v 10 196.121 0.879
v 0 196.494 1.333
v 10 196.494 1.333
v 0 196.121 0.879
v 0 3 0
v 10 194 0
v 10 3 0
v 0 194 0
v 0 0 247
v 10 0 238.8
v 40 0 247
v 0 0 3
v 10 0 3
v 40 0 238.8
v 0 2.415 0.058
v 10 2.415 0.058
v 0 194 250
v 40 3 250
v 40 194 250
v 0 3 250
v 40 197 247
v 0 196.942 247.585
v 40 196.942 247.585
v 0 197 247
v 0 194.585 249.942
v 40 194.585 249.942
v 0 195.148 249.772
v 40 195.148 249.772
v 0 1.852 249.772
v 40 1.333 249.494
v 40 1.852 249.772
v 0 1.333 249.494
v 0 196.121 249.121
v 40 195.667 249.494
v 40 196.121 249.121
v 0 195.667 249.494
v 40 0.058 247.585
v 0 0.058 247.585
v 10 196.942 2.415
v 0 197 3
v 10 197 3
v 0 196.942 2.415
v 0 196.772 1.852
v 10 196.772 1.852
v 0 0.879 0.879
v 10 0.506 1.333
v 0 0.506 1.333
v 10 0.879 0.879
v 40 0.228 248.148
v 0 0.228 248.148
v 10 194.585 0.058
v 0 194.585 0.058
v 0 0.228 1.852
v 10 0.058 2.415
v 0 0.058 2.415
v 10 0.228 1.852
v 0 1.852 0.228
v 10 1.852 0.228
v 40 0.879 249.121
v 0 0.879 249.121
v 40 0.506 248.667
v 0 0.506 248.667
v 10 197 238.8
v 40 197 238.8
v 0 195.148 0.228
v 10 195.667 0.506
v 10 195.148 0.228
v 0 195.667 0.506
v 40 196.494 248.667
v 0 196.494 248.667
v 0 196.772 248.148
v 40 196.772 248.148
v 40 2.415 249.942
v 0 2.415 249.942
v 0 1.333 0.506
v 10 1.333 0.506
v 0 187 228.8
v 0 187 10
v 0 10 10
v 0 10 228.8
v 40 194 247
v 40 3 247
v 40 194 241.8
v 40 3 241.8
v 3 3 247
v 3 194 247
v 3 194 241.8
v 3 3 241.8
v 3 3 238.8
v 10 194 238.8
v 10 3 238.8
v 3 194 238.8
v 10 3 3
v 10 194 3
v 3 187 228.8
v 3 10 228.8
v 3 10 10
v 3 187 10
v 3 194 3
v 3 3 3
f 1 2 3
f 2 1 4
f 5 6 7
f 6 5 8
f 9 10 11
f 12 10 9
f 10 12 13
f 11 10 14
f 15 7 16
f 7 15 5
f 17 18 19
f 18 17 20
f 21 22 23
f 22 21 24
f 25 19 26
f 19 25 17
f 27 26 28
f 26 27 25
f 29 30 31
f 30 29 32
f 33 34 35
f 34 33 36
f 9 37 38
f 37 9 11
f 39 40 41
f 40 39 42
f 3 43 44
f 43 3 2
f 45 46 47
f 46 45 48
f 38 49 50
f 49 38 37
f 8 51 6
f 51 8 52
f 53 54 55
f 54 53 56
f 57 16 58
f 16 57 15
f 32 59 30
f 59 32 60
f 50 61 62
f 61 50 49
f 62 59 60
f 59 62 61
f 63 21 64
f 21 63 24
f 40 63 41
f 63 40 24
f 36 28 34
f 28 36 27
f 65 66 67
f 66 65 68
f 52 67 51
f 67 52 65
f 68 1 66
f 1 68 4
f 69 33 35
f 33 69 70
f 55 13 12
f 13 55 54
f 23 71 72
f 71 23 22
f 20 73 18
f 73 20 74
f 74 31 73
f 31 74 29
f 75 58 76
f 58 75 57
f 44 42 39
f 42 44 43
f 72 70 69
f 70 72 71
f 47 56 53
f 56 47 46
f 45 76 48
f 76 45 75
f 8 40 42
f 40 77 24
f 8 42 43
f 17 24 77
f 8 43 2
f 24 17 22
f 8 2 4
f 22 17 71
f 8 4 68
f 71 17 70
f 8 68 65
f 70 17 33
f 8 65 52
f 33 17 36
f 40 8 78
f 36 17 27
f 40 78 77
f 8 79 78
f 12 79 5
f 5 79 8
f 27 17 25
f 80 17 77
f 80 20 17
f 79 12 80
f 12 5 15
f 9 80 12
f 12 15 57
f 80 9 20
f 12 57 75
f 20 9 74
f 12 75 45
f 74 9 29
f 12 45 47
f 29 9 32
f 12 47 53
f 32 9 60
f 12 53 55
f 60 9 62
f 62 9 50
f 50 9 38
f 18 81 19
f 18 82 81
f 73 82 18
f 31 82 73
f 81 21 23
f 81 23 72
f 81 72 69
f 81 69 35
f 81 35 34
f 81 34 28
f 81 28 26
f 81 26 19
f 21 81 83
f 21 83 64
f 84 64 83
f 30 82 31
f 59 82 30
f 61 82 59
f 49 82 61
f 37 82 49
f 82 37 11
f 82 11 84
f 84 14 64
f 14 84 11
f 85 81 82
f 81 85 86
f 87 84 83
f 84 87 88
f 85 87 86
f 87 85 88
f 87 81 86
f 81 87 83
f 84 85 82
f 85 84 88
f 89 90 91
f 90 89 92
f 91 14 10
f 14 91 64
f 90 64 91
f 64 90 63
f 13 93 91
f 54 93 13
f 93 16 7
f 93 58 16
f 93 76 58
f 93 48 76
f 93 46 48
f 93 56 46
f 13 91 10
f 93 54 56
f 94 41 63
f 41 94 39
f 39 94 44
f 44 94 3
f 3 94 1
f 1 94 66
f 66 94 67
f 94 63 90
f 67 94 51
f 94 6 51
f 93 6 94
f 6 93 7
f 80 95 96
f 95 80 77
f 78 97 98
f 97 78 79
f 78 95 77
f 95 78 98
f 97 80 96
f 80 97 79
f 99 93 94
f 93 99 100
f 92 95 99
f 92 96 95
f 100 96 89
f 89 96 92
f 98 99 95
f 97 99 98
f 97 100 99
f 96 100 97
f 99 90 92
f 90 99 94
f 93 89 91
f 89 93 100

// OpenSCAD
meshD = 191;
meshH  = 5.2;
thick = 3;
R = thick;
W = 40;
D = meshD + thick * 2;
H = 250;

difference() {
    hull() {
        for (y = [thick, D - thick])
            for (z = [thick, H - thick])
                translate([0, y, z])
                    rotate([0, 90, 0])
                        cylinder(r = thick, h = W, $fn = 32);
    }
    // mesh slit
    translate([thick, thick, H - thick - meshH])
        cube([W, meshD, meshH]);
    // 
    translate([10, 0, 0])
        cube([W, D, H - thick * 2 - meshH]);
    translate([0, 10, 10])
        cube([10, D - 20, H - thick * 2 - meshH - 20]);
    translate([thick, thick, thick])
        cube([10 - thick, D - thick * 2, H - thick * 3 - meshH]);
}
